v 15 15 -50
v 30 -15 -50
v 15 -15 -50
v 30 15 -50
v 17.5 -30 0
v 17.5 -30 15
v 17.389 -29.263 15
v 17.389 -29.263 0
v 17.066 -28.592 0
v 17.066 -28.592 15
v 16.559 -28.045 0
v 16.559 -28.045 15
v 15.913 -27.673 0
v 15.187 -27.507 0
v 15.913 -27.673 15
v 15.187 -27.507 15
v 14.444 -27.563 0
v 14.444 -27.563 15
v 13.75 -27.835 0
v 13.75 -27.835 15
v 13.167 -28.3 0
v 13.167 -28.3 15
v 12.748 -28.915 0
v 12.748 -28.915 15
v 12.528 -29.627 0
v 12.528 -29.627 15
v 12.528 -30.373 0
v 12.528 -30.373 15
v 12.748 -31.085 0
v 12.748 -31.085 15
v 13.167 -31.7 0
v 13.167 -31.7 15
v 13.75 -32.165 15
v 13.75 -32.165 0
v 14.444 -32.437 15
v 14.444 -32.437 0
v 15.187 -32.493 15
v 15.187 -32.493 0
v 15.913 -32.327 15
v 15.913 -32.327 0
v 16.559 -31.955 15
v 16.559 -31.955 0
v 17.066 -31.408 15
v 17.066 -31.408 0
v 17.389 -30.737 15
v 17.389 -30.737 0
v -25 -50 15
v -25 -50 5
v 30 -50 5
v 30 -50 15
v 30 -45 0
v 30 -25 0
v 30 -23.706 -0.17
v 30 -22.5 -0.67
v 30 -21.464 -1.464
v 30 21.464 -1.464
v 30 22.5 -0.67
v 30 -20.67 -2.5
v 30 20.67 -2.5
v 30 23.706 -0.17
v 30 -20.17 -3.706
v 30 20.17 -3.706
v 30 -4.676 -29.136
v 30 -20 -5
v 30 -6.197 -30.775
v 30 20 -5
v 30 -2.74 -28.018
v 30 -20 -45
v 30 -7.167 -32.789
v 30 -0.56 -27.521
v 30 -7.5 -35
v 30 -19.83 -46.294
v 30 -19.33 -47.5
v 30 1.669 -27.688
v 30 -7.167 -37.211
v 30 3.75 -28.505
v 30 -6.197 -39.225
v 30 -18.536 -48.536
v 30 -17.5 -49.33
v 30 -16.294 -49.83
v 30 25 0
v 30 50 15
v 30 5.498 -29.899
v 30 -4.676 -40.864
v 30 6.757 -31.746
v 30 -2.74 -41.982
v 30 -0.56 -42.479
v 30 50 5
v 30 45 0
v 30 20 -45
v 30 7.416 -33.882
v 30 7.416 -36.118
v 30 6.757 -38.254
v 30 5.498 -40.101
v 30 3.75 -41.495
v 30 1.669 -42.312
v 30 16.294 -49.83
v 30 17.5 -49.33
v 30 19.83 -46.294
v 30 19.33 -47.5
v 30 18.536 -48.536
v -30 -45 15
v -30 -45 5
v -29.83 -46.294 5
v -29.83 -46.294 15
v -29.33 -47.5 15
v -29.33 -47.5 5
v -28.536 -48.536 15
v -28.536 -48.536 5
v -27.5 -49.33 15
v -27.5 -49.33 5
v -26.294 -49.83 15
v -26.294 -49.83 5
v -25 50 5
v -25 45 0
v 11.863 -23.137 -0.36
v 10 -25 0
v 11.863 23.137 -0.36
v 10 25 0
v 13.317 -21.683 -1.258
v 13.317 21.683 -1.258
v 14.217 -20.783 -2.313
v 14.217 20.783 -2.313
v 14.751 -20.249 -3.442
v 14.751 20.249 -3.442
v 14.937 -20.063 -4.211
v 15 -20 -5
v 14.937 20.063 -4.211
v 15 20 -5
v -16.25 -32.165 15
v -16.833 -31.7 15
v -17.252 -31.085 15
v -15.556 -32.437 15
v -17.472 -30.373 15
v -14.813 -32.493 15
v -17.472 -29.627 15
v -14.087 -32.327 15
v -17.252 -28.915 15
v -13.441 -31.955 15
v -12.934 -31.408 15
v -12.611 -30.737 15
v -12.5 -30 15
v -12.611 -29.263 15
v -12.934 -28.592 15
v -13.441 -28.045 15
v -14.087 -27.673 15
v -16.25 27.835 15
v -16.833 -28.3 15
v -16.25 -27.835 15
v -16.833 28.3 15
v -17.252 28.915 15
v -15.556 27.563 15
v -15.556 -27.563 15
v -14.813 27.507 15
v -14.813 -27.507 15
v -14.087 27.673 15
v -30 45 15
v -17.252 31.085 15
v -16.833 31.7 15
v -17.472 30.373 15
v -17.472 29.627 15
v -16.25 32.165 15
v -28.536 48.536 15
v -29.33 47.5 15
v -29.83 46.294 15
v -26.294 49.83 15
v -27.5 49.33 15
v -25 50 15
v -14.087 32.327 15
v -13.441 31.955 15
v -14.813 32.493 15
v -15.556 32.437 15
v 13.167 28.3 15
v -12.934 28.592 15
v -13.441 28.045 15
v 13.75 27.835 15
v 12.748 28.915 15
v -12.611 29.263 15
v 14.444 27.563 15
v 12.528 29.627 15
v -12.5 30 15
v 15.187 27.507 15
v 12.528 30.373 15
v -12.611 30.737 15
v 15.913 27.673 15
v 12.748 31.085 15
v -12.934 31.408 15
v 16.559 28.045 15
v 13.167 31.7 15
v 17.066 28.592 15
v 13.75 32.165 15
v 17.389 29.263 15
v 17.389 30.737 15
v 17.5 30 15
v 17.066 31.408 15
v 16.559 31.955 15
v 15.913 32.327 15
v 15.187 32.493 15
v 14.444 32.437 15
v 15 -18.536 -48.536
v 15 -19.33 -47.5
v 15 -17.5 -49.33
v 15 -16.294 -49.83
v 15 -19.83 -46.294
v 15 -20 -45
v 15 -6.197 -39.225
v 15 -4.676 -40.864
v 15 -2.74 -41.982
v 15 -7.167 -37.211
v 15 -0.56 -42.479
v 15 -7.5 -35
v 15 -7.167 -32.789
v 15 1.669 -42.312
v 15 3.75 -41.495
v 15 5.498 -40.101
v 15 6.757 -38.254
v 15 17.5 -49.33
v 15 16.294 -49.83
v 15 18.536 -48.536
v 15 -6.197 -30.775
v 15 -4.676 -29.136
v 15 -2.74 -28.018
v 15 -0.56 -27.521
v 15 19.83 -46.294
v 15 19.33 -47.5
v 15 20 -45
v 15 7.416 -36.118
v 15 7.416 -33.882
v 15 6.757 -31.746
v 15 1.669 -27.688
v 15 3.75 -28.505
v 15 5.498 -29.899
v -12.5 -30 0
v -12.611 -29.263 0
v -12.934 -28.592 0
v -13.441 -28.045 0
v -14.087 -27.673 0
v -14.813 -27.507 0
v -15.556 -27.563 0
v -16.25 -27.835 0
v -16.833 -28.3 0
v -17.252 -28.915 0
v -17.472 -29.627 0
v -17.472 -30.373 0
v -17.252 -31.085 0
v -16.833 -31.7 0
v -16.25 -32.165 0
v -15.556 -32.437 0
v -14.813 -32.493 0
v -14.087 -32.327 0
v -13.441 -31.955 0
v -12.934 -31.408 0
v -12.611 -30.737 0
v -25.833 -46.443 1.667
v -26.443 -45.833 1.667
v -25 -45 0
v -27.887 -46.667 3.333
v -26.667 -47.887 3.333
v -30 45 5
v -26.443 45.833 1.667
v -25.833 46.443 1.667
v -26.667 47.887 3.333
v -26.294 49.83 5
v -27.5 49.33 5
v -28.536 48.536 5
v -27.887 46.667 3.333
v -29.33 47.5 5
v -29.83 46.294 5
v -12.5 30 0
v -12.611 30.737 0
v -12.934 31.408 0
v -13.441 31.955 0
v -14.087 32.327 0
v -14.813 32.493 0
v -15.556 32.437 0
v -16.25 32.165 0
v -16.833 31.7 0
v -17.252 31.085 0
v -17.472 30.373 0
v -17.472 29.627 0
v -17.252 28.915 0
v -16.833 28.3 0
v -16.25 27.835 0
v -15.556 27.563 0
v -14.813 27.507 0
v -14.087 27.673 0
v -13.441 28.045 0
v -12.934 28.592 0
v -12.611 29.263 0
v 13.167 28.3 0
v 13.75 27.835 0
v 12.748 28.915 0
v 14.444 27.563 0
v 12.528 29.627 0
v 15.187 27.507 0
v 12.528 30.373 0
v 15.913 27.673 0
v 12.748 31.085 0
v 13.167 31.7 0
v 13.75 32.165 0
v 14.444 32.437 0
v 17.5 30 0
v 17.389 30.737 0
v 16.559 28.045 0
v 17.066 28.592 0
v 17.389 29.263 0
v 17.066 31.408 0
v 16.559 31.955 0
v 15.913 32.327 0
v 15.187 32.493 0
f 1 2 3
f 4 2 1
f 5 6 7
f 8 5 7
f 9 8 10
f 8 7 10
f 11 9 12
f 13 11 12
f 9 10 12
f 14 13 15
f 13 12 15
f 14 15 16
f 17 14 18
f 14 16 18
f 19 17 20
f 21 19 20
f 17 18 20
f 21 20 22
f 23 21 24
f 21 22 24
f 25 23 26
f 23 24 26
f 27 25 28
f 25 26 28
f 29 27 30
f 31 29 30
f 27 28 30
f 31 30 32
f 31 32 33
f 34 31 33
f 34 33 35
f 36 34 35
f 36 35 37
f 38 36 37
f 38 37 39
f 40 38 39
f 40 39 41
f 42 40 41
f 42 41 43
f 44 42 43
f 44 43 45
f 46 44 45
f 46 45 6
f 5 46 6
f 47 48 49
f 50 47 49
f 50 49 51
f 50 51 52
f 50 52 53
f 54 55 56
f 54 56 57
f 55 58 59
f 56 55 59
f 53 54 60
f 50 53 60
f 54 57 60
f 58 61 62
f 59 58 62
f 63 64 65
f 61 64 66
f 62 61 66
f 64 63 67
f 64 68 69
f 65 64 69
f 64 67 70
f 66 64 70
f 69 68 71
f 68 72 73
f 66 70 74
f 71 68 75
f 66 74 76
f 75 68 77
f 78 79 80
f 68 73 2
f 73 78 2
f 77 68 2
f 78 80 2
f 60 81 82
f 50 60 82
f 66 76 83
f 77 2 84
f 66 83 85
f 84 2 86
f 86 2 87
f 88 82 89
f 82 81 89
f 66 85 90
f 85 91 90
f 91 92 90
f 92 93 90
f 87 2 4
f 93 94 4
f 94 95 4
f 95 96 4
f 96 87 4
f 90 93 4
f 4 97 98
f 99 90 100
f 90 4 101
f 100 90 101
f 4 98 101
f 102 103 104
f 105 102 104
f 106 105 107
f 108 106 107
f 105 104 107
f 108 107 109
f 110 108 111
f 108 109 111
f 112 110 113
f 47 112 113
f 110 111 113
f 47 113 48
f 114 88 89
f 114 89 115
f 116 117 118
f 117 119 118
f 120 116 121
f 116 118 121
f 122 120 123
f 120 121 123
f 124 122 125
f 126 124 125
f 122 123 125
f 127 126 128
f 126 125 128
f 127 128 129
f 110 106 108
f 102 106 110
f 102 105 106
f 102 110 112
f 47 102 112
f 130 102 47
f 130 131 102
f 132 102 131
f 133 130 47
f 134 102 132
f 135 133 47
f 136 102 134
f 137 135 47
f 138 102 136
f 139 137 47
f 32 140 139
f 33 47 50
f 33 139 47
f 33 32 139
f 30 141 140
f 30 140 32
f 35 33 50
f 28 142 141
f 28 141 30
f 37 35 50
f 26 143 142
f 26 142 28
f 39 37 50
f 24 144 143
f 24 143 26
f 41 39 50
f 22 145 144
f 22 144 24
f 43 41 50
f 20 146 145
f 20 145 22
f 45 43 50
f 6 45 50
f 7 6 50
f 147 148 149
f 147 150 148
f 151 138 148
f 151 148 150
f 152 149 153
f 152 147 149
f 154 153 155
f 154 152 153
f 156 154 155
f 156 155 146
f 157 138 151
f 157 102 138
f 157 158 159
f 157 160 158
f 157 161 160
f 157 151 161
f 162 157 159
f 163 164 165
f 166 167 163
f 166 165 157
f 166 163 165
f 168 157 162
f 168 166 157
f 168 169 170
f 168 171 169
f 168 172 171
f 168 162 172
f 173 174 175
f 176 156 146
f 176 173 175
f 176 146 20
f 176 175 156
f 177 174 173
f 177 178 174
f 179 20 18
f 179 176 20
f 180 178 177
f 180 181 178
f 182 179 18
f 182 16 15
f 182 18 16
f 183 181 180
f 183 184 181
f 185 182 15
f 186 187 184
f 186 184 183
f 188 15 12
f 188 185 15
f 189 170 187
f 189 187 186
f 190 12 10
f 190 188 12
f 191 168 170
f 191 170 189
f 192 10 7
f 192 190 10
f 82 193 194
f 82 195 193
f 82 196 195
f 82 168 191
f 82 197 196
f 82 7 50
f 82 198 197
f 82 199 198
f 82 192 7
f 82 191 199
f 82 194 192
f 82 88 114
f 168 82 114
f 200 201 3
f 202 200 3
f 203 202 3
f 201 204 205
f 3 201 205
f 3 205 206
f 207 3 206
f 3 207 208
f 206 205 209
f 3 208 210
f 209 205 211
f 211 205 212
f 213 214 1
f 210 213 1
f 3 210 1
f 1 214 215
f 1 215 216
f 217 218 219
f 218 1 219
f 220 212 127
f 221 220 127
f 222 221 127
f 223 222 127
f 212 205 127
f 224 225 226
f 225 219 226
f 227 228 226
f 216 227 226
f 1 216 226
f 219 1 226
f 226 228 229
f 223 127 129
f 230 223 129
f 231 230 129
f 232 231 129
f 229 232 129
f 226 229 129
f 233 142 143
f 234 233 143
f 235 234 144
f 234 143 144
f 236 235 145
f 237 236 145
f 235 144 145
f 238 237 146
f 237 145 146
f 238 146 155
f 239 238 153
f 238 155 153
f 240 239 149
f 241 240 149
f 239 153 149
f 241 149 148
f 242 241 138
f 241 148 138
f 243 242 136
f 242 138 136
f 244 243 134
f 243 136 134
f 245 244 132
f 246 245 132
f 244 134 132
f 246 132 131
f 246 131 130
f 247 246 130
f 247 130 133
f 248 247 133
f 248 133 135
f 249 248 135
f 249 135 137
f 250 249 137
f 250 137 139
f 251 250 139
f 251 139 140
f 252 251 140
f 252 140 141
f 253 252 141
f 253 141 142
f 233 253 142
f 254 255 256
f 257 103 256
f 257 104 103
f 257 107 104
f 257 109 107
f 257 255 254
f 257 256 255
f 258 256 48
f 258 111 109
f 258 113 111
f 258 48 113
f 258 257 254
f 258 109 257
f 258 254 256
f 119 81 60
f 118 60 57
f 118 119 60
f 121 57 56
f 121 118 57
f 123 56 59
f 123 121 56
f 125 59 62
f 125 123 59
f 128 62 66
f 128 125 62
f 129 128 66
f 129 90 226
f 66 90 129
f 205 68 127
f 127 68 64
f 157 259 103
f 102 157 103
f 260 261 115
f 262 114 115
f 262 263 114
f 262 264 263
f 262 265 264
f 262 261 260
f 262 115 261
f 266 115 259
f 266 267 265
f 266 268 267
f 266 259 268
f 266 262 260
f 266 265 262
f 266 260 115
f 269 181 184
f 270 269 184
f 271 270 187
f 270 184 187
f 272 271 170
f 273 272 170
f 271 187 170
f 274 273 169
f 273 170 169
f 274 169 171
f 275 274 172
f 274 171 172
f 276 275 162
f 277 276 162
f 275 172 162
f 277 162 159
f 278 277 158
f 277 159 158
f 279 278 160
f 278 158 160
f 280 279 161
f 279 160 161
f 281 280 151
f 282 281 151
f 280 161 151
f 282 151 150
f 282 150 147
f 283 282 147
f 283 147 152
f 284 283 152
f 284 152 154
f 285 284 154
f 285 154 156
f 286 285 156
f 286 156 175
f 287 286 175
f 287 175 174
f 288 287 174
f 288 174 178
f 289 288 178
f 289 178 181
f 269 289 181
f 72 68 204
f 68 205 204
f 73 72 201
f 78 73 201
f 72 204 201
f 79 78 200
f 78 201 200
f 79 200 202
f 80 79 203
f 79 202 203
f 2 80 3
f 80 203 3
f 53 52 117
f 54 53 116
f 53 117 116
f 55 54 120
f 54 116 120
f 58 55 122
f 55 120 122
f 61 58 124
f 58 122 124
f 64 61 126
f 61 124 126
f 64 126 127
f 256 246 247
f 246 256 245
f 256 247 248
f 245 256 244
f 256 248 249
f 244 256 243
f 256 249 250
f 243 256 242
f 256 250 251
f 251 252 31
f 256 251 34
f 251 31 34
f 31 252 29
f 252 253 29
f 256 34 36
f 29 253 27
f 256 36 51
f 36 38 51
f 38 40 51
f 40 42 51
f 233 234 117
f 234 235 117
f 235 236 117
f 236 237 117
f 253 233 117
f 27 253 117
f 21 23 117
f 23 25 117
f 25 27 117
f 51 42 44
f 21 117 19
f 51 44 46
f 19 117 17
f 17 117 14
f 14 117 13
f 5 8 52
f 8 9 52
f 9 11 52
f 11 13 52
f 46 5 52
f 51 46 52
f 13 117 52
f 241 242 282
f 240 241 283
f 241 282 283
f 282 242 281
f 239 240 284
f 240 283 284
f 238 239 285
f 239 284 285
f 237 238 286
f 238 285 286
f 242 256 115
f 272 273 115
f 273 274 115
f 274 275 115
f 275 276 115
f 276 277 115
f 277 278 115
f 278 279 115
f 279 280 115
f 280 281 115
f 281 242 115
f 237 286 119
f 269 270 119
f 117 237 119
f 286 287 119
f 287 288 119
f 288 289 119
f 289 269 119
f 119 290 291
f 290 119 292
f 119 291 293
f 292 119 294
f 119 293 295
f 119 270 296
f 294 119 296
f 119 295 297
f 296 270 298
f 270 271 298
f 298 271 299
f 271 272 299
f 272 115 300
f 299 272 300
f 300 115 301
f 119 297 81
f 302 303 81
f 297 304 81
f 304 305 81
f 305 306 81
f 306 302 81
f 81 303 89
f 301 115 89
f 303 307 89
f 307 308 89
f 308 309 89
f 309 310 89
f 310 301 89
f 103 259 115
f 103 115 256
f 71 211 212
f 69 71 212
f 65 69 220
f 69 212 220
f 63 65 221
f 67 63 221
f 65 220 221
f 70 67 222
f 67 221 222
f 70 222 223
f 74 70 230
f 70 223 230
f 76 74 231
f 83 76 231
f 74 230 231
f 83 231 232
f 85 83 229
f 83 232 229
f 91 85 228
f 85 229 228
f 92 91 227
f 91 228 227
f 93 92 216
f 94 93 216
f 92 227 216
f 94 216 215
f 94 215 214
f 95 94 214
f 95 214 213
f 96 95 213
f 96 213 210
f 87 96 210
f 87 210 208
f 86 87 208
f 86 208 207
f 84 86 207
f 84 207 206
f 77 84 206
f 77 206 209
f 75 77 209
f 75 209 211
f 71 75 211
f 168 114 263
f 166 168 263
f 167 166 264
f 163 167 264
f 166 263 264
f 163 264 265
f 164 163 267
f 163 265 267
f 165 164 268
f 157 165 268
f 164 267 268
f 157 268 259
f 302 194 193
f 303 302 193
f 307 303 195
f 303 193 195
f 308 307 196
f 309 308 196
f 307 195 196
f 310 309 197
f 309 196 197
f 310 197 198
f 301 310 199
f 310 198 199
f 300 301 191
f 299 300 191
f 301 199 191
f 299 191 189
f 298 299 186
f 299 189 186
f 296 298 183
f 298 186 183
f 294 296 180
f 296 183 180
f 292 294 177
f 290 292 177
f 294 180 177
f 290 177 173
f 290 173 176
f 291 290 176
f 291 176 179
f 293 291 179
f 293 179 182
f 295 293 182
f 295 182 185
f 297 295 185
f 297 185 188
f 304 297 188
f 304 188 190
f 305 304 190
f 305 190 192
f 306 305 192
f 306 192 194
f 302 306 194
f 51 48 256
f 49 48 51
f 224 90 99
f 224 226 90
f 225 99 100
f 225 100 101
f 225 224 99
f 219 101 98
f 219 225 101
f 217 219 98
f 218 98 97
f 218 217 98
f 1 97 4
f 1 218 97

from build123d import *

# Parameters (mm, degrees)
F1_DEPTH = 15
F2_W     = 40
F2_H     = 50
F3_DEPTH = 15
F4_R     = 5
F5_SIZE  = 5
F6_R     = 7.5
F7_DEPTH = 25
F8_R     = 2.5
F9_DEPTH = 25


with BuildPart() as f1:
    # F0 (on Top) → F1 (new body)
    with BuildSketch(Plane.XY):
        with BuildLine():
            Line((30, 50), (-25, 50))
            ThreePointArc((-25, 50), (-28.5355339059, 48.5355339059), (-30, 45))
            Line((-30, 45), (-30, -45))
            ThreePointArc((-30, -45), (-28.5355339059, -48.5355339059), (-25, -50))
            Line((-25, -50), (30, -50))
            Line((30, -50), (30, 50))
        make_face()
    extrude(amount=F1_DEPTH)

    # F2 (on face) → F3 (join)
    with BuildSketch(Plane.YZ.offset(30)):
        with Locations((0, -25)):
            Rectangle(F2_W, F2_H)
    extrude(amount=-F3_DEPTH)

    # F4
    f4_edges = [f1.edges().sort_by_distance(p)[0] for p in [
        (22.5, 20, 0),
        (15, 0, 0),
        (22.5, 20, -50),
        (22.5, -20, -50),
        (22.5, -20, 0),
    ]]
    fillet(f4_edges, radius=F4_R)

    # F5
    f5_edges = [f1.edges().sort_by_distance(p)[0] for p in [
        (2.5, 50, 0),
    ]]
    chamfer(f5_edges, length=F5_SIZE)

    # F6 (on face) → F7 (cut)
    with BuildSketch(Plane(origin=(15, 0, 0), x_dir=(0, -1, 0), z_dir=(-1, 0, 0))):
        with Locations((0, -35)):
            Circle(F6_R)
    extrude(amount=-F7_DEPTH, mode=Mode.SUBTRACT)

    # F8 (on face) → F9 (cut)
    with BuildSketch(Plane.XY.offset(15)):
        with Locations((-15, -30)):
            Circle(F8_R)
        with Locations((15, -30)):
            Circle(F8_R)
        with Locations((15, 30)):
            Circle(F8_R)
        with Locations((-15, 30)):
            Circle(F8_R)
    extrude(amount=-F9_DEPTH, mode=Mode.SUBTRACT)


solid = f1.part
